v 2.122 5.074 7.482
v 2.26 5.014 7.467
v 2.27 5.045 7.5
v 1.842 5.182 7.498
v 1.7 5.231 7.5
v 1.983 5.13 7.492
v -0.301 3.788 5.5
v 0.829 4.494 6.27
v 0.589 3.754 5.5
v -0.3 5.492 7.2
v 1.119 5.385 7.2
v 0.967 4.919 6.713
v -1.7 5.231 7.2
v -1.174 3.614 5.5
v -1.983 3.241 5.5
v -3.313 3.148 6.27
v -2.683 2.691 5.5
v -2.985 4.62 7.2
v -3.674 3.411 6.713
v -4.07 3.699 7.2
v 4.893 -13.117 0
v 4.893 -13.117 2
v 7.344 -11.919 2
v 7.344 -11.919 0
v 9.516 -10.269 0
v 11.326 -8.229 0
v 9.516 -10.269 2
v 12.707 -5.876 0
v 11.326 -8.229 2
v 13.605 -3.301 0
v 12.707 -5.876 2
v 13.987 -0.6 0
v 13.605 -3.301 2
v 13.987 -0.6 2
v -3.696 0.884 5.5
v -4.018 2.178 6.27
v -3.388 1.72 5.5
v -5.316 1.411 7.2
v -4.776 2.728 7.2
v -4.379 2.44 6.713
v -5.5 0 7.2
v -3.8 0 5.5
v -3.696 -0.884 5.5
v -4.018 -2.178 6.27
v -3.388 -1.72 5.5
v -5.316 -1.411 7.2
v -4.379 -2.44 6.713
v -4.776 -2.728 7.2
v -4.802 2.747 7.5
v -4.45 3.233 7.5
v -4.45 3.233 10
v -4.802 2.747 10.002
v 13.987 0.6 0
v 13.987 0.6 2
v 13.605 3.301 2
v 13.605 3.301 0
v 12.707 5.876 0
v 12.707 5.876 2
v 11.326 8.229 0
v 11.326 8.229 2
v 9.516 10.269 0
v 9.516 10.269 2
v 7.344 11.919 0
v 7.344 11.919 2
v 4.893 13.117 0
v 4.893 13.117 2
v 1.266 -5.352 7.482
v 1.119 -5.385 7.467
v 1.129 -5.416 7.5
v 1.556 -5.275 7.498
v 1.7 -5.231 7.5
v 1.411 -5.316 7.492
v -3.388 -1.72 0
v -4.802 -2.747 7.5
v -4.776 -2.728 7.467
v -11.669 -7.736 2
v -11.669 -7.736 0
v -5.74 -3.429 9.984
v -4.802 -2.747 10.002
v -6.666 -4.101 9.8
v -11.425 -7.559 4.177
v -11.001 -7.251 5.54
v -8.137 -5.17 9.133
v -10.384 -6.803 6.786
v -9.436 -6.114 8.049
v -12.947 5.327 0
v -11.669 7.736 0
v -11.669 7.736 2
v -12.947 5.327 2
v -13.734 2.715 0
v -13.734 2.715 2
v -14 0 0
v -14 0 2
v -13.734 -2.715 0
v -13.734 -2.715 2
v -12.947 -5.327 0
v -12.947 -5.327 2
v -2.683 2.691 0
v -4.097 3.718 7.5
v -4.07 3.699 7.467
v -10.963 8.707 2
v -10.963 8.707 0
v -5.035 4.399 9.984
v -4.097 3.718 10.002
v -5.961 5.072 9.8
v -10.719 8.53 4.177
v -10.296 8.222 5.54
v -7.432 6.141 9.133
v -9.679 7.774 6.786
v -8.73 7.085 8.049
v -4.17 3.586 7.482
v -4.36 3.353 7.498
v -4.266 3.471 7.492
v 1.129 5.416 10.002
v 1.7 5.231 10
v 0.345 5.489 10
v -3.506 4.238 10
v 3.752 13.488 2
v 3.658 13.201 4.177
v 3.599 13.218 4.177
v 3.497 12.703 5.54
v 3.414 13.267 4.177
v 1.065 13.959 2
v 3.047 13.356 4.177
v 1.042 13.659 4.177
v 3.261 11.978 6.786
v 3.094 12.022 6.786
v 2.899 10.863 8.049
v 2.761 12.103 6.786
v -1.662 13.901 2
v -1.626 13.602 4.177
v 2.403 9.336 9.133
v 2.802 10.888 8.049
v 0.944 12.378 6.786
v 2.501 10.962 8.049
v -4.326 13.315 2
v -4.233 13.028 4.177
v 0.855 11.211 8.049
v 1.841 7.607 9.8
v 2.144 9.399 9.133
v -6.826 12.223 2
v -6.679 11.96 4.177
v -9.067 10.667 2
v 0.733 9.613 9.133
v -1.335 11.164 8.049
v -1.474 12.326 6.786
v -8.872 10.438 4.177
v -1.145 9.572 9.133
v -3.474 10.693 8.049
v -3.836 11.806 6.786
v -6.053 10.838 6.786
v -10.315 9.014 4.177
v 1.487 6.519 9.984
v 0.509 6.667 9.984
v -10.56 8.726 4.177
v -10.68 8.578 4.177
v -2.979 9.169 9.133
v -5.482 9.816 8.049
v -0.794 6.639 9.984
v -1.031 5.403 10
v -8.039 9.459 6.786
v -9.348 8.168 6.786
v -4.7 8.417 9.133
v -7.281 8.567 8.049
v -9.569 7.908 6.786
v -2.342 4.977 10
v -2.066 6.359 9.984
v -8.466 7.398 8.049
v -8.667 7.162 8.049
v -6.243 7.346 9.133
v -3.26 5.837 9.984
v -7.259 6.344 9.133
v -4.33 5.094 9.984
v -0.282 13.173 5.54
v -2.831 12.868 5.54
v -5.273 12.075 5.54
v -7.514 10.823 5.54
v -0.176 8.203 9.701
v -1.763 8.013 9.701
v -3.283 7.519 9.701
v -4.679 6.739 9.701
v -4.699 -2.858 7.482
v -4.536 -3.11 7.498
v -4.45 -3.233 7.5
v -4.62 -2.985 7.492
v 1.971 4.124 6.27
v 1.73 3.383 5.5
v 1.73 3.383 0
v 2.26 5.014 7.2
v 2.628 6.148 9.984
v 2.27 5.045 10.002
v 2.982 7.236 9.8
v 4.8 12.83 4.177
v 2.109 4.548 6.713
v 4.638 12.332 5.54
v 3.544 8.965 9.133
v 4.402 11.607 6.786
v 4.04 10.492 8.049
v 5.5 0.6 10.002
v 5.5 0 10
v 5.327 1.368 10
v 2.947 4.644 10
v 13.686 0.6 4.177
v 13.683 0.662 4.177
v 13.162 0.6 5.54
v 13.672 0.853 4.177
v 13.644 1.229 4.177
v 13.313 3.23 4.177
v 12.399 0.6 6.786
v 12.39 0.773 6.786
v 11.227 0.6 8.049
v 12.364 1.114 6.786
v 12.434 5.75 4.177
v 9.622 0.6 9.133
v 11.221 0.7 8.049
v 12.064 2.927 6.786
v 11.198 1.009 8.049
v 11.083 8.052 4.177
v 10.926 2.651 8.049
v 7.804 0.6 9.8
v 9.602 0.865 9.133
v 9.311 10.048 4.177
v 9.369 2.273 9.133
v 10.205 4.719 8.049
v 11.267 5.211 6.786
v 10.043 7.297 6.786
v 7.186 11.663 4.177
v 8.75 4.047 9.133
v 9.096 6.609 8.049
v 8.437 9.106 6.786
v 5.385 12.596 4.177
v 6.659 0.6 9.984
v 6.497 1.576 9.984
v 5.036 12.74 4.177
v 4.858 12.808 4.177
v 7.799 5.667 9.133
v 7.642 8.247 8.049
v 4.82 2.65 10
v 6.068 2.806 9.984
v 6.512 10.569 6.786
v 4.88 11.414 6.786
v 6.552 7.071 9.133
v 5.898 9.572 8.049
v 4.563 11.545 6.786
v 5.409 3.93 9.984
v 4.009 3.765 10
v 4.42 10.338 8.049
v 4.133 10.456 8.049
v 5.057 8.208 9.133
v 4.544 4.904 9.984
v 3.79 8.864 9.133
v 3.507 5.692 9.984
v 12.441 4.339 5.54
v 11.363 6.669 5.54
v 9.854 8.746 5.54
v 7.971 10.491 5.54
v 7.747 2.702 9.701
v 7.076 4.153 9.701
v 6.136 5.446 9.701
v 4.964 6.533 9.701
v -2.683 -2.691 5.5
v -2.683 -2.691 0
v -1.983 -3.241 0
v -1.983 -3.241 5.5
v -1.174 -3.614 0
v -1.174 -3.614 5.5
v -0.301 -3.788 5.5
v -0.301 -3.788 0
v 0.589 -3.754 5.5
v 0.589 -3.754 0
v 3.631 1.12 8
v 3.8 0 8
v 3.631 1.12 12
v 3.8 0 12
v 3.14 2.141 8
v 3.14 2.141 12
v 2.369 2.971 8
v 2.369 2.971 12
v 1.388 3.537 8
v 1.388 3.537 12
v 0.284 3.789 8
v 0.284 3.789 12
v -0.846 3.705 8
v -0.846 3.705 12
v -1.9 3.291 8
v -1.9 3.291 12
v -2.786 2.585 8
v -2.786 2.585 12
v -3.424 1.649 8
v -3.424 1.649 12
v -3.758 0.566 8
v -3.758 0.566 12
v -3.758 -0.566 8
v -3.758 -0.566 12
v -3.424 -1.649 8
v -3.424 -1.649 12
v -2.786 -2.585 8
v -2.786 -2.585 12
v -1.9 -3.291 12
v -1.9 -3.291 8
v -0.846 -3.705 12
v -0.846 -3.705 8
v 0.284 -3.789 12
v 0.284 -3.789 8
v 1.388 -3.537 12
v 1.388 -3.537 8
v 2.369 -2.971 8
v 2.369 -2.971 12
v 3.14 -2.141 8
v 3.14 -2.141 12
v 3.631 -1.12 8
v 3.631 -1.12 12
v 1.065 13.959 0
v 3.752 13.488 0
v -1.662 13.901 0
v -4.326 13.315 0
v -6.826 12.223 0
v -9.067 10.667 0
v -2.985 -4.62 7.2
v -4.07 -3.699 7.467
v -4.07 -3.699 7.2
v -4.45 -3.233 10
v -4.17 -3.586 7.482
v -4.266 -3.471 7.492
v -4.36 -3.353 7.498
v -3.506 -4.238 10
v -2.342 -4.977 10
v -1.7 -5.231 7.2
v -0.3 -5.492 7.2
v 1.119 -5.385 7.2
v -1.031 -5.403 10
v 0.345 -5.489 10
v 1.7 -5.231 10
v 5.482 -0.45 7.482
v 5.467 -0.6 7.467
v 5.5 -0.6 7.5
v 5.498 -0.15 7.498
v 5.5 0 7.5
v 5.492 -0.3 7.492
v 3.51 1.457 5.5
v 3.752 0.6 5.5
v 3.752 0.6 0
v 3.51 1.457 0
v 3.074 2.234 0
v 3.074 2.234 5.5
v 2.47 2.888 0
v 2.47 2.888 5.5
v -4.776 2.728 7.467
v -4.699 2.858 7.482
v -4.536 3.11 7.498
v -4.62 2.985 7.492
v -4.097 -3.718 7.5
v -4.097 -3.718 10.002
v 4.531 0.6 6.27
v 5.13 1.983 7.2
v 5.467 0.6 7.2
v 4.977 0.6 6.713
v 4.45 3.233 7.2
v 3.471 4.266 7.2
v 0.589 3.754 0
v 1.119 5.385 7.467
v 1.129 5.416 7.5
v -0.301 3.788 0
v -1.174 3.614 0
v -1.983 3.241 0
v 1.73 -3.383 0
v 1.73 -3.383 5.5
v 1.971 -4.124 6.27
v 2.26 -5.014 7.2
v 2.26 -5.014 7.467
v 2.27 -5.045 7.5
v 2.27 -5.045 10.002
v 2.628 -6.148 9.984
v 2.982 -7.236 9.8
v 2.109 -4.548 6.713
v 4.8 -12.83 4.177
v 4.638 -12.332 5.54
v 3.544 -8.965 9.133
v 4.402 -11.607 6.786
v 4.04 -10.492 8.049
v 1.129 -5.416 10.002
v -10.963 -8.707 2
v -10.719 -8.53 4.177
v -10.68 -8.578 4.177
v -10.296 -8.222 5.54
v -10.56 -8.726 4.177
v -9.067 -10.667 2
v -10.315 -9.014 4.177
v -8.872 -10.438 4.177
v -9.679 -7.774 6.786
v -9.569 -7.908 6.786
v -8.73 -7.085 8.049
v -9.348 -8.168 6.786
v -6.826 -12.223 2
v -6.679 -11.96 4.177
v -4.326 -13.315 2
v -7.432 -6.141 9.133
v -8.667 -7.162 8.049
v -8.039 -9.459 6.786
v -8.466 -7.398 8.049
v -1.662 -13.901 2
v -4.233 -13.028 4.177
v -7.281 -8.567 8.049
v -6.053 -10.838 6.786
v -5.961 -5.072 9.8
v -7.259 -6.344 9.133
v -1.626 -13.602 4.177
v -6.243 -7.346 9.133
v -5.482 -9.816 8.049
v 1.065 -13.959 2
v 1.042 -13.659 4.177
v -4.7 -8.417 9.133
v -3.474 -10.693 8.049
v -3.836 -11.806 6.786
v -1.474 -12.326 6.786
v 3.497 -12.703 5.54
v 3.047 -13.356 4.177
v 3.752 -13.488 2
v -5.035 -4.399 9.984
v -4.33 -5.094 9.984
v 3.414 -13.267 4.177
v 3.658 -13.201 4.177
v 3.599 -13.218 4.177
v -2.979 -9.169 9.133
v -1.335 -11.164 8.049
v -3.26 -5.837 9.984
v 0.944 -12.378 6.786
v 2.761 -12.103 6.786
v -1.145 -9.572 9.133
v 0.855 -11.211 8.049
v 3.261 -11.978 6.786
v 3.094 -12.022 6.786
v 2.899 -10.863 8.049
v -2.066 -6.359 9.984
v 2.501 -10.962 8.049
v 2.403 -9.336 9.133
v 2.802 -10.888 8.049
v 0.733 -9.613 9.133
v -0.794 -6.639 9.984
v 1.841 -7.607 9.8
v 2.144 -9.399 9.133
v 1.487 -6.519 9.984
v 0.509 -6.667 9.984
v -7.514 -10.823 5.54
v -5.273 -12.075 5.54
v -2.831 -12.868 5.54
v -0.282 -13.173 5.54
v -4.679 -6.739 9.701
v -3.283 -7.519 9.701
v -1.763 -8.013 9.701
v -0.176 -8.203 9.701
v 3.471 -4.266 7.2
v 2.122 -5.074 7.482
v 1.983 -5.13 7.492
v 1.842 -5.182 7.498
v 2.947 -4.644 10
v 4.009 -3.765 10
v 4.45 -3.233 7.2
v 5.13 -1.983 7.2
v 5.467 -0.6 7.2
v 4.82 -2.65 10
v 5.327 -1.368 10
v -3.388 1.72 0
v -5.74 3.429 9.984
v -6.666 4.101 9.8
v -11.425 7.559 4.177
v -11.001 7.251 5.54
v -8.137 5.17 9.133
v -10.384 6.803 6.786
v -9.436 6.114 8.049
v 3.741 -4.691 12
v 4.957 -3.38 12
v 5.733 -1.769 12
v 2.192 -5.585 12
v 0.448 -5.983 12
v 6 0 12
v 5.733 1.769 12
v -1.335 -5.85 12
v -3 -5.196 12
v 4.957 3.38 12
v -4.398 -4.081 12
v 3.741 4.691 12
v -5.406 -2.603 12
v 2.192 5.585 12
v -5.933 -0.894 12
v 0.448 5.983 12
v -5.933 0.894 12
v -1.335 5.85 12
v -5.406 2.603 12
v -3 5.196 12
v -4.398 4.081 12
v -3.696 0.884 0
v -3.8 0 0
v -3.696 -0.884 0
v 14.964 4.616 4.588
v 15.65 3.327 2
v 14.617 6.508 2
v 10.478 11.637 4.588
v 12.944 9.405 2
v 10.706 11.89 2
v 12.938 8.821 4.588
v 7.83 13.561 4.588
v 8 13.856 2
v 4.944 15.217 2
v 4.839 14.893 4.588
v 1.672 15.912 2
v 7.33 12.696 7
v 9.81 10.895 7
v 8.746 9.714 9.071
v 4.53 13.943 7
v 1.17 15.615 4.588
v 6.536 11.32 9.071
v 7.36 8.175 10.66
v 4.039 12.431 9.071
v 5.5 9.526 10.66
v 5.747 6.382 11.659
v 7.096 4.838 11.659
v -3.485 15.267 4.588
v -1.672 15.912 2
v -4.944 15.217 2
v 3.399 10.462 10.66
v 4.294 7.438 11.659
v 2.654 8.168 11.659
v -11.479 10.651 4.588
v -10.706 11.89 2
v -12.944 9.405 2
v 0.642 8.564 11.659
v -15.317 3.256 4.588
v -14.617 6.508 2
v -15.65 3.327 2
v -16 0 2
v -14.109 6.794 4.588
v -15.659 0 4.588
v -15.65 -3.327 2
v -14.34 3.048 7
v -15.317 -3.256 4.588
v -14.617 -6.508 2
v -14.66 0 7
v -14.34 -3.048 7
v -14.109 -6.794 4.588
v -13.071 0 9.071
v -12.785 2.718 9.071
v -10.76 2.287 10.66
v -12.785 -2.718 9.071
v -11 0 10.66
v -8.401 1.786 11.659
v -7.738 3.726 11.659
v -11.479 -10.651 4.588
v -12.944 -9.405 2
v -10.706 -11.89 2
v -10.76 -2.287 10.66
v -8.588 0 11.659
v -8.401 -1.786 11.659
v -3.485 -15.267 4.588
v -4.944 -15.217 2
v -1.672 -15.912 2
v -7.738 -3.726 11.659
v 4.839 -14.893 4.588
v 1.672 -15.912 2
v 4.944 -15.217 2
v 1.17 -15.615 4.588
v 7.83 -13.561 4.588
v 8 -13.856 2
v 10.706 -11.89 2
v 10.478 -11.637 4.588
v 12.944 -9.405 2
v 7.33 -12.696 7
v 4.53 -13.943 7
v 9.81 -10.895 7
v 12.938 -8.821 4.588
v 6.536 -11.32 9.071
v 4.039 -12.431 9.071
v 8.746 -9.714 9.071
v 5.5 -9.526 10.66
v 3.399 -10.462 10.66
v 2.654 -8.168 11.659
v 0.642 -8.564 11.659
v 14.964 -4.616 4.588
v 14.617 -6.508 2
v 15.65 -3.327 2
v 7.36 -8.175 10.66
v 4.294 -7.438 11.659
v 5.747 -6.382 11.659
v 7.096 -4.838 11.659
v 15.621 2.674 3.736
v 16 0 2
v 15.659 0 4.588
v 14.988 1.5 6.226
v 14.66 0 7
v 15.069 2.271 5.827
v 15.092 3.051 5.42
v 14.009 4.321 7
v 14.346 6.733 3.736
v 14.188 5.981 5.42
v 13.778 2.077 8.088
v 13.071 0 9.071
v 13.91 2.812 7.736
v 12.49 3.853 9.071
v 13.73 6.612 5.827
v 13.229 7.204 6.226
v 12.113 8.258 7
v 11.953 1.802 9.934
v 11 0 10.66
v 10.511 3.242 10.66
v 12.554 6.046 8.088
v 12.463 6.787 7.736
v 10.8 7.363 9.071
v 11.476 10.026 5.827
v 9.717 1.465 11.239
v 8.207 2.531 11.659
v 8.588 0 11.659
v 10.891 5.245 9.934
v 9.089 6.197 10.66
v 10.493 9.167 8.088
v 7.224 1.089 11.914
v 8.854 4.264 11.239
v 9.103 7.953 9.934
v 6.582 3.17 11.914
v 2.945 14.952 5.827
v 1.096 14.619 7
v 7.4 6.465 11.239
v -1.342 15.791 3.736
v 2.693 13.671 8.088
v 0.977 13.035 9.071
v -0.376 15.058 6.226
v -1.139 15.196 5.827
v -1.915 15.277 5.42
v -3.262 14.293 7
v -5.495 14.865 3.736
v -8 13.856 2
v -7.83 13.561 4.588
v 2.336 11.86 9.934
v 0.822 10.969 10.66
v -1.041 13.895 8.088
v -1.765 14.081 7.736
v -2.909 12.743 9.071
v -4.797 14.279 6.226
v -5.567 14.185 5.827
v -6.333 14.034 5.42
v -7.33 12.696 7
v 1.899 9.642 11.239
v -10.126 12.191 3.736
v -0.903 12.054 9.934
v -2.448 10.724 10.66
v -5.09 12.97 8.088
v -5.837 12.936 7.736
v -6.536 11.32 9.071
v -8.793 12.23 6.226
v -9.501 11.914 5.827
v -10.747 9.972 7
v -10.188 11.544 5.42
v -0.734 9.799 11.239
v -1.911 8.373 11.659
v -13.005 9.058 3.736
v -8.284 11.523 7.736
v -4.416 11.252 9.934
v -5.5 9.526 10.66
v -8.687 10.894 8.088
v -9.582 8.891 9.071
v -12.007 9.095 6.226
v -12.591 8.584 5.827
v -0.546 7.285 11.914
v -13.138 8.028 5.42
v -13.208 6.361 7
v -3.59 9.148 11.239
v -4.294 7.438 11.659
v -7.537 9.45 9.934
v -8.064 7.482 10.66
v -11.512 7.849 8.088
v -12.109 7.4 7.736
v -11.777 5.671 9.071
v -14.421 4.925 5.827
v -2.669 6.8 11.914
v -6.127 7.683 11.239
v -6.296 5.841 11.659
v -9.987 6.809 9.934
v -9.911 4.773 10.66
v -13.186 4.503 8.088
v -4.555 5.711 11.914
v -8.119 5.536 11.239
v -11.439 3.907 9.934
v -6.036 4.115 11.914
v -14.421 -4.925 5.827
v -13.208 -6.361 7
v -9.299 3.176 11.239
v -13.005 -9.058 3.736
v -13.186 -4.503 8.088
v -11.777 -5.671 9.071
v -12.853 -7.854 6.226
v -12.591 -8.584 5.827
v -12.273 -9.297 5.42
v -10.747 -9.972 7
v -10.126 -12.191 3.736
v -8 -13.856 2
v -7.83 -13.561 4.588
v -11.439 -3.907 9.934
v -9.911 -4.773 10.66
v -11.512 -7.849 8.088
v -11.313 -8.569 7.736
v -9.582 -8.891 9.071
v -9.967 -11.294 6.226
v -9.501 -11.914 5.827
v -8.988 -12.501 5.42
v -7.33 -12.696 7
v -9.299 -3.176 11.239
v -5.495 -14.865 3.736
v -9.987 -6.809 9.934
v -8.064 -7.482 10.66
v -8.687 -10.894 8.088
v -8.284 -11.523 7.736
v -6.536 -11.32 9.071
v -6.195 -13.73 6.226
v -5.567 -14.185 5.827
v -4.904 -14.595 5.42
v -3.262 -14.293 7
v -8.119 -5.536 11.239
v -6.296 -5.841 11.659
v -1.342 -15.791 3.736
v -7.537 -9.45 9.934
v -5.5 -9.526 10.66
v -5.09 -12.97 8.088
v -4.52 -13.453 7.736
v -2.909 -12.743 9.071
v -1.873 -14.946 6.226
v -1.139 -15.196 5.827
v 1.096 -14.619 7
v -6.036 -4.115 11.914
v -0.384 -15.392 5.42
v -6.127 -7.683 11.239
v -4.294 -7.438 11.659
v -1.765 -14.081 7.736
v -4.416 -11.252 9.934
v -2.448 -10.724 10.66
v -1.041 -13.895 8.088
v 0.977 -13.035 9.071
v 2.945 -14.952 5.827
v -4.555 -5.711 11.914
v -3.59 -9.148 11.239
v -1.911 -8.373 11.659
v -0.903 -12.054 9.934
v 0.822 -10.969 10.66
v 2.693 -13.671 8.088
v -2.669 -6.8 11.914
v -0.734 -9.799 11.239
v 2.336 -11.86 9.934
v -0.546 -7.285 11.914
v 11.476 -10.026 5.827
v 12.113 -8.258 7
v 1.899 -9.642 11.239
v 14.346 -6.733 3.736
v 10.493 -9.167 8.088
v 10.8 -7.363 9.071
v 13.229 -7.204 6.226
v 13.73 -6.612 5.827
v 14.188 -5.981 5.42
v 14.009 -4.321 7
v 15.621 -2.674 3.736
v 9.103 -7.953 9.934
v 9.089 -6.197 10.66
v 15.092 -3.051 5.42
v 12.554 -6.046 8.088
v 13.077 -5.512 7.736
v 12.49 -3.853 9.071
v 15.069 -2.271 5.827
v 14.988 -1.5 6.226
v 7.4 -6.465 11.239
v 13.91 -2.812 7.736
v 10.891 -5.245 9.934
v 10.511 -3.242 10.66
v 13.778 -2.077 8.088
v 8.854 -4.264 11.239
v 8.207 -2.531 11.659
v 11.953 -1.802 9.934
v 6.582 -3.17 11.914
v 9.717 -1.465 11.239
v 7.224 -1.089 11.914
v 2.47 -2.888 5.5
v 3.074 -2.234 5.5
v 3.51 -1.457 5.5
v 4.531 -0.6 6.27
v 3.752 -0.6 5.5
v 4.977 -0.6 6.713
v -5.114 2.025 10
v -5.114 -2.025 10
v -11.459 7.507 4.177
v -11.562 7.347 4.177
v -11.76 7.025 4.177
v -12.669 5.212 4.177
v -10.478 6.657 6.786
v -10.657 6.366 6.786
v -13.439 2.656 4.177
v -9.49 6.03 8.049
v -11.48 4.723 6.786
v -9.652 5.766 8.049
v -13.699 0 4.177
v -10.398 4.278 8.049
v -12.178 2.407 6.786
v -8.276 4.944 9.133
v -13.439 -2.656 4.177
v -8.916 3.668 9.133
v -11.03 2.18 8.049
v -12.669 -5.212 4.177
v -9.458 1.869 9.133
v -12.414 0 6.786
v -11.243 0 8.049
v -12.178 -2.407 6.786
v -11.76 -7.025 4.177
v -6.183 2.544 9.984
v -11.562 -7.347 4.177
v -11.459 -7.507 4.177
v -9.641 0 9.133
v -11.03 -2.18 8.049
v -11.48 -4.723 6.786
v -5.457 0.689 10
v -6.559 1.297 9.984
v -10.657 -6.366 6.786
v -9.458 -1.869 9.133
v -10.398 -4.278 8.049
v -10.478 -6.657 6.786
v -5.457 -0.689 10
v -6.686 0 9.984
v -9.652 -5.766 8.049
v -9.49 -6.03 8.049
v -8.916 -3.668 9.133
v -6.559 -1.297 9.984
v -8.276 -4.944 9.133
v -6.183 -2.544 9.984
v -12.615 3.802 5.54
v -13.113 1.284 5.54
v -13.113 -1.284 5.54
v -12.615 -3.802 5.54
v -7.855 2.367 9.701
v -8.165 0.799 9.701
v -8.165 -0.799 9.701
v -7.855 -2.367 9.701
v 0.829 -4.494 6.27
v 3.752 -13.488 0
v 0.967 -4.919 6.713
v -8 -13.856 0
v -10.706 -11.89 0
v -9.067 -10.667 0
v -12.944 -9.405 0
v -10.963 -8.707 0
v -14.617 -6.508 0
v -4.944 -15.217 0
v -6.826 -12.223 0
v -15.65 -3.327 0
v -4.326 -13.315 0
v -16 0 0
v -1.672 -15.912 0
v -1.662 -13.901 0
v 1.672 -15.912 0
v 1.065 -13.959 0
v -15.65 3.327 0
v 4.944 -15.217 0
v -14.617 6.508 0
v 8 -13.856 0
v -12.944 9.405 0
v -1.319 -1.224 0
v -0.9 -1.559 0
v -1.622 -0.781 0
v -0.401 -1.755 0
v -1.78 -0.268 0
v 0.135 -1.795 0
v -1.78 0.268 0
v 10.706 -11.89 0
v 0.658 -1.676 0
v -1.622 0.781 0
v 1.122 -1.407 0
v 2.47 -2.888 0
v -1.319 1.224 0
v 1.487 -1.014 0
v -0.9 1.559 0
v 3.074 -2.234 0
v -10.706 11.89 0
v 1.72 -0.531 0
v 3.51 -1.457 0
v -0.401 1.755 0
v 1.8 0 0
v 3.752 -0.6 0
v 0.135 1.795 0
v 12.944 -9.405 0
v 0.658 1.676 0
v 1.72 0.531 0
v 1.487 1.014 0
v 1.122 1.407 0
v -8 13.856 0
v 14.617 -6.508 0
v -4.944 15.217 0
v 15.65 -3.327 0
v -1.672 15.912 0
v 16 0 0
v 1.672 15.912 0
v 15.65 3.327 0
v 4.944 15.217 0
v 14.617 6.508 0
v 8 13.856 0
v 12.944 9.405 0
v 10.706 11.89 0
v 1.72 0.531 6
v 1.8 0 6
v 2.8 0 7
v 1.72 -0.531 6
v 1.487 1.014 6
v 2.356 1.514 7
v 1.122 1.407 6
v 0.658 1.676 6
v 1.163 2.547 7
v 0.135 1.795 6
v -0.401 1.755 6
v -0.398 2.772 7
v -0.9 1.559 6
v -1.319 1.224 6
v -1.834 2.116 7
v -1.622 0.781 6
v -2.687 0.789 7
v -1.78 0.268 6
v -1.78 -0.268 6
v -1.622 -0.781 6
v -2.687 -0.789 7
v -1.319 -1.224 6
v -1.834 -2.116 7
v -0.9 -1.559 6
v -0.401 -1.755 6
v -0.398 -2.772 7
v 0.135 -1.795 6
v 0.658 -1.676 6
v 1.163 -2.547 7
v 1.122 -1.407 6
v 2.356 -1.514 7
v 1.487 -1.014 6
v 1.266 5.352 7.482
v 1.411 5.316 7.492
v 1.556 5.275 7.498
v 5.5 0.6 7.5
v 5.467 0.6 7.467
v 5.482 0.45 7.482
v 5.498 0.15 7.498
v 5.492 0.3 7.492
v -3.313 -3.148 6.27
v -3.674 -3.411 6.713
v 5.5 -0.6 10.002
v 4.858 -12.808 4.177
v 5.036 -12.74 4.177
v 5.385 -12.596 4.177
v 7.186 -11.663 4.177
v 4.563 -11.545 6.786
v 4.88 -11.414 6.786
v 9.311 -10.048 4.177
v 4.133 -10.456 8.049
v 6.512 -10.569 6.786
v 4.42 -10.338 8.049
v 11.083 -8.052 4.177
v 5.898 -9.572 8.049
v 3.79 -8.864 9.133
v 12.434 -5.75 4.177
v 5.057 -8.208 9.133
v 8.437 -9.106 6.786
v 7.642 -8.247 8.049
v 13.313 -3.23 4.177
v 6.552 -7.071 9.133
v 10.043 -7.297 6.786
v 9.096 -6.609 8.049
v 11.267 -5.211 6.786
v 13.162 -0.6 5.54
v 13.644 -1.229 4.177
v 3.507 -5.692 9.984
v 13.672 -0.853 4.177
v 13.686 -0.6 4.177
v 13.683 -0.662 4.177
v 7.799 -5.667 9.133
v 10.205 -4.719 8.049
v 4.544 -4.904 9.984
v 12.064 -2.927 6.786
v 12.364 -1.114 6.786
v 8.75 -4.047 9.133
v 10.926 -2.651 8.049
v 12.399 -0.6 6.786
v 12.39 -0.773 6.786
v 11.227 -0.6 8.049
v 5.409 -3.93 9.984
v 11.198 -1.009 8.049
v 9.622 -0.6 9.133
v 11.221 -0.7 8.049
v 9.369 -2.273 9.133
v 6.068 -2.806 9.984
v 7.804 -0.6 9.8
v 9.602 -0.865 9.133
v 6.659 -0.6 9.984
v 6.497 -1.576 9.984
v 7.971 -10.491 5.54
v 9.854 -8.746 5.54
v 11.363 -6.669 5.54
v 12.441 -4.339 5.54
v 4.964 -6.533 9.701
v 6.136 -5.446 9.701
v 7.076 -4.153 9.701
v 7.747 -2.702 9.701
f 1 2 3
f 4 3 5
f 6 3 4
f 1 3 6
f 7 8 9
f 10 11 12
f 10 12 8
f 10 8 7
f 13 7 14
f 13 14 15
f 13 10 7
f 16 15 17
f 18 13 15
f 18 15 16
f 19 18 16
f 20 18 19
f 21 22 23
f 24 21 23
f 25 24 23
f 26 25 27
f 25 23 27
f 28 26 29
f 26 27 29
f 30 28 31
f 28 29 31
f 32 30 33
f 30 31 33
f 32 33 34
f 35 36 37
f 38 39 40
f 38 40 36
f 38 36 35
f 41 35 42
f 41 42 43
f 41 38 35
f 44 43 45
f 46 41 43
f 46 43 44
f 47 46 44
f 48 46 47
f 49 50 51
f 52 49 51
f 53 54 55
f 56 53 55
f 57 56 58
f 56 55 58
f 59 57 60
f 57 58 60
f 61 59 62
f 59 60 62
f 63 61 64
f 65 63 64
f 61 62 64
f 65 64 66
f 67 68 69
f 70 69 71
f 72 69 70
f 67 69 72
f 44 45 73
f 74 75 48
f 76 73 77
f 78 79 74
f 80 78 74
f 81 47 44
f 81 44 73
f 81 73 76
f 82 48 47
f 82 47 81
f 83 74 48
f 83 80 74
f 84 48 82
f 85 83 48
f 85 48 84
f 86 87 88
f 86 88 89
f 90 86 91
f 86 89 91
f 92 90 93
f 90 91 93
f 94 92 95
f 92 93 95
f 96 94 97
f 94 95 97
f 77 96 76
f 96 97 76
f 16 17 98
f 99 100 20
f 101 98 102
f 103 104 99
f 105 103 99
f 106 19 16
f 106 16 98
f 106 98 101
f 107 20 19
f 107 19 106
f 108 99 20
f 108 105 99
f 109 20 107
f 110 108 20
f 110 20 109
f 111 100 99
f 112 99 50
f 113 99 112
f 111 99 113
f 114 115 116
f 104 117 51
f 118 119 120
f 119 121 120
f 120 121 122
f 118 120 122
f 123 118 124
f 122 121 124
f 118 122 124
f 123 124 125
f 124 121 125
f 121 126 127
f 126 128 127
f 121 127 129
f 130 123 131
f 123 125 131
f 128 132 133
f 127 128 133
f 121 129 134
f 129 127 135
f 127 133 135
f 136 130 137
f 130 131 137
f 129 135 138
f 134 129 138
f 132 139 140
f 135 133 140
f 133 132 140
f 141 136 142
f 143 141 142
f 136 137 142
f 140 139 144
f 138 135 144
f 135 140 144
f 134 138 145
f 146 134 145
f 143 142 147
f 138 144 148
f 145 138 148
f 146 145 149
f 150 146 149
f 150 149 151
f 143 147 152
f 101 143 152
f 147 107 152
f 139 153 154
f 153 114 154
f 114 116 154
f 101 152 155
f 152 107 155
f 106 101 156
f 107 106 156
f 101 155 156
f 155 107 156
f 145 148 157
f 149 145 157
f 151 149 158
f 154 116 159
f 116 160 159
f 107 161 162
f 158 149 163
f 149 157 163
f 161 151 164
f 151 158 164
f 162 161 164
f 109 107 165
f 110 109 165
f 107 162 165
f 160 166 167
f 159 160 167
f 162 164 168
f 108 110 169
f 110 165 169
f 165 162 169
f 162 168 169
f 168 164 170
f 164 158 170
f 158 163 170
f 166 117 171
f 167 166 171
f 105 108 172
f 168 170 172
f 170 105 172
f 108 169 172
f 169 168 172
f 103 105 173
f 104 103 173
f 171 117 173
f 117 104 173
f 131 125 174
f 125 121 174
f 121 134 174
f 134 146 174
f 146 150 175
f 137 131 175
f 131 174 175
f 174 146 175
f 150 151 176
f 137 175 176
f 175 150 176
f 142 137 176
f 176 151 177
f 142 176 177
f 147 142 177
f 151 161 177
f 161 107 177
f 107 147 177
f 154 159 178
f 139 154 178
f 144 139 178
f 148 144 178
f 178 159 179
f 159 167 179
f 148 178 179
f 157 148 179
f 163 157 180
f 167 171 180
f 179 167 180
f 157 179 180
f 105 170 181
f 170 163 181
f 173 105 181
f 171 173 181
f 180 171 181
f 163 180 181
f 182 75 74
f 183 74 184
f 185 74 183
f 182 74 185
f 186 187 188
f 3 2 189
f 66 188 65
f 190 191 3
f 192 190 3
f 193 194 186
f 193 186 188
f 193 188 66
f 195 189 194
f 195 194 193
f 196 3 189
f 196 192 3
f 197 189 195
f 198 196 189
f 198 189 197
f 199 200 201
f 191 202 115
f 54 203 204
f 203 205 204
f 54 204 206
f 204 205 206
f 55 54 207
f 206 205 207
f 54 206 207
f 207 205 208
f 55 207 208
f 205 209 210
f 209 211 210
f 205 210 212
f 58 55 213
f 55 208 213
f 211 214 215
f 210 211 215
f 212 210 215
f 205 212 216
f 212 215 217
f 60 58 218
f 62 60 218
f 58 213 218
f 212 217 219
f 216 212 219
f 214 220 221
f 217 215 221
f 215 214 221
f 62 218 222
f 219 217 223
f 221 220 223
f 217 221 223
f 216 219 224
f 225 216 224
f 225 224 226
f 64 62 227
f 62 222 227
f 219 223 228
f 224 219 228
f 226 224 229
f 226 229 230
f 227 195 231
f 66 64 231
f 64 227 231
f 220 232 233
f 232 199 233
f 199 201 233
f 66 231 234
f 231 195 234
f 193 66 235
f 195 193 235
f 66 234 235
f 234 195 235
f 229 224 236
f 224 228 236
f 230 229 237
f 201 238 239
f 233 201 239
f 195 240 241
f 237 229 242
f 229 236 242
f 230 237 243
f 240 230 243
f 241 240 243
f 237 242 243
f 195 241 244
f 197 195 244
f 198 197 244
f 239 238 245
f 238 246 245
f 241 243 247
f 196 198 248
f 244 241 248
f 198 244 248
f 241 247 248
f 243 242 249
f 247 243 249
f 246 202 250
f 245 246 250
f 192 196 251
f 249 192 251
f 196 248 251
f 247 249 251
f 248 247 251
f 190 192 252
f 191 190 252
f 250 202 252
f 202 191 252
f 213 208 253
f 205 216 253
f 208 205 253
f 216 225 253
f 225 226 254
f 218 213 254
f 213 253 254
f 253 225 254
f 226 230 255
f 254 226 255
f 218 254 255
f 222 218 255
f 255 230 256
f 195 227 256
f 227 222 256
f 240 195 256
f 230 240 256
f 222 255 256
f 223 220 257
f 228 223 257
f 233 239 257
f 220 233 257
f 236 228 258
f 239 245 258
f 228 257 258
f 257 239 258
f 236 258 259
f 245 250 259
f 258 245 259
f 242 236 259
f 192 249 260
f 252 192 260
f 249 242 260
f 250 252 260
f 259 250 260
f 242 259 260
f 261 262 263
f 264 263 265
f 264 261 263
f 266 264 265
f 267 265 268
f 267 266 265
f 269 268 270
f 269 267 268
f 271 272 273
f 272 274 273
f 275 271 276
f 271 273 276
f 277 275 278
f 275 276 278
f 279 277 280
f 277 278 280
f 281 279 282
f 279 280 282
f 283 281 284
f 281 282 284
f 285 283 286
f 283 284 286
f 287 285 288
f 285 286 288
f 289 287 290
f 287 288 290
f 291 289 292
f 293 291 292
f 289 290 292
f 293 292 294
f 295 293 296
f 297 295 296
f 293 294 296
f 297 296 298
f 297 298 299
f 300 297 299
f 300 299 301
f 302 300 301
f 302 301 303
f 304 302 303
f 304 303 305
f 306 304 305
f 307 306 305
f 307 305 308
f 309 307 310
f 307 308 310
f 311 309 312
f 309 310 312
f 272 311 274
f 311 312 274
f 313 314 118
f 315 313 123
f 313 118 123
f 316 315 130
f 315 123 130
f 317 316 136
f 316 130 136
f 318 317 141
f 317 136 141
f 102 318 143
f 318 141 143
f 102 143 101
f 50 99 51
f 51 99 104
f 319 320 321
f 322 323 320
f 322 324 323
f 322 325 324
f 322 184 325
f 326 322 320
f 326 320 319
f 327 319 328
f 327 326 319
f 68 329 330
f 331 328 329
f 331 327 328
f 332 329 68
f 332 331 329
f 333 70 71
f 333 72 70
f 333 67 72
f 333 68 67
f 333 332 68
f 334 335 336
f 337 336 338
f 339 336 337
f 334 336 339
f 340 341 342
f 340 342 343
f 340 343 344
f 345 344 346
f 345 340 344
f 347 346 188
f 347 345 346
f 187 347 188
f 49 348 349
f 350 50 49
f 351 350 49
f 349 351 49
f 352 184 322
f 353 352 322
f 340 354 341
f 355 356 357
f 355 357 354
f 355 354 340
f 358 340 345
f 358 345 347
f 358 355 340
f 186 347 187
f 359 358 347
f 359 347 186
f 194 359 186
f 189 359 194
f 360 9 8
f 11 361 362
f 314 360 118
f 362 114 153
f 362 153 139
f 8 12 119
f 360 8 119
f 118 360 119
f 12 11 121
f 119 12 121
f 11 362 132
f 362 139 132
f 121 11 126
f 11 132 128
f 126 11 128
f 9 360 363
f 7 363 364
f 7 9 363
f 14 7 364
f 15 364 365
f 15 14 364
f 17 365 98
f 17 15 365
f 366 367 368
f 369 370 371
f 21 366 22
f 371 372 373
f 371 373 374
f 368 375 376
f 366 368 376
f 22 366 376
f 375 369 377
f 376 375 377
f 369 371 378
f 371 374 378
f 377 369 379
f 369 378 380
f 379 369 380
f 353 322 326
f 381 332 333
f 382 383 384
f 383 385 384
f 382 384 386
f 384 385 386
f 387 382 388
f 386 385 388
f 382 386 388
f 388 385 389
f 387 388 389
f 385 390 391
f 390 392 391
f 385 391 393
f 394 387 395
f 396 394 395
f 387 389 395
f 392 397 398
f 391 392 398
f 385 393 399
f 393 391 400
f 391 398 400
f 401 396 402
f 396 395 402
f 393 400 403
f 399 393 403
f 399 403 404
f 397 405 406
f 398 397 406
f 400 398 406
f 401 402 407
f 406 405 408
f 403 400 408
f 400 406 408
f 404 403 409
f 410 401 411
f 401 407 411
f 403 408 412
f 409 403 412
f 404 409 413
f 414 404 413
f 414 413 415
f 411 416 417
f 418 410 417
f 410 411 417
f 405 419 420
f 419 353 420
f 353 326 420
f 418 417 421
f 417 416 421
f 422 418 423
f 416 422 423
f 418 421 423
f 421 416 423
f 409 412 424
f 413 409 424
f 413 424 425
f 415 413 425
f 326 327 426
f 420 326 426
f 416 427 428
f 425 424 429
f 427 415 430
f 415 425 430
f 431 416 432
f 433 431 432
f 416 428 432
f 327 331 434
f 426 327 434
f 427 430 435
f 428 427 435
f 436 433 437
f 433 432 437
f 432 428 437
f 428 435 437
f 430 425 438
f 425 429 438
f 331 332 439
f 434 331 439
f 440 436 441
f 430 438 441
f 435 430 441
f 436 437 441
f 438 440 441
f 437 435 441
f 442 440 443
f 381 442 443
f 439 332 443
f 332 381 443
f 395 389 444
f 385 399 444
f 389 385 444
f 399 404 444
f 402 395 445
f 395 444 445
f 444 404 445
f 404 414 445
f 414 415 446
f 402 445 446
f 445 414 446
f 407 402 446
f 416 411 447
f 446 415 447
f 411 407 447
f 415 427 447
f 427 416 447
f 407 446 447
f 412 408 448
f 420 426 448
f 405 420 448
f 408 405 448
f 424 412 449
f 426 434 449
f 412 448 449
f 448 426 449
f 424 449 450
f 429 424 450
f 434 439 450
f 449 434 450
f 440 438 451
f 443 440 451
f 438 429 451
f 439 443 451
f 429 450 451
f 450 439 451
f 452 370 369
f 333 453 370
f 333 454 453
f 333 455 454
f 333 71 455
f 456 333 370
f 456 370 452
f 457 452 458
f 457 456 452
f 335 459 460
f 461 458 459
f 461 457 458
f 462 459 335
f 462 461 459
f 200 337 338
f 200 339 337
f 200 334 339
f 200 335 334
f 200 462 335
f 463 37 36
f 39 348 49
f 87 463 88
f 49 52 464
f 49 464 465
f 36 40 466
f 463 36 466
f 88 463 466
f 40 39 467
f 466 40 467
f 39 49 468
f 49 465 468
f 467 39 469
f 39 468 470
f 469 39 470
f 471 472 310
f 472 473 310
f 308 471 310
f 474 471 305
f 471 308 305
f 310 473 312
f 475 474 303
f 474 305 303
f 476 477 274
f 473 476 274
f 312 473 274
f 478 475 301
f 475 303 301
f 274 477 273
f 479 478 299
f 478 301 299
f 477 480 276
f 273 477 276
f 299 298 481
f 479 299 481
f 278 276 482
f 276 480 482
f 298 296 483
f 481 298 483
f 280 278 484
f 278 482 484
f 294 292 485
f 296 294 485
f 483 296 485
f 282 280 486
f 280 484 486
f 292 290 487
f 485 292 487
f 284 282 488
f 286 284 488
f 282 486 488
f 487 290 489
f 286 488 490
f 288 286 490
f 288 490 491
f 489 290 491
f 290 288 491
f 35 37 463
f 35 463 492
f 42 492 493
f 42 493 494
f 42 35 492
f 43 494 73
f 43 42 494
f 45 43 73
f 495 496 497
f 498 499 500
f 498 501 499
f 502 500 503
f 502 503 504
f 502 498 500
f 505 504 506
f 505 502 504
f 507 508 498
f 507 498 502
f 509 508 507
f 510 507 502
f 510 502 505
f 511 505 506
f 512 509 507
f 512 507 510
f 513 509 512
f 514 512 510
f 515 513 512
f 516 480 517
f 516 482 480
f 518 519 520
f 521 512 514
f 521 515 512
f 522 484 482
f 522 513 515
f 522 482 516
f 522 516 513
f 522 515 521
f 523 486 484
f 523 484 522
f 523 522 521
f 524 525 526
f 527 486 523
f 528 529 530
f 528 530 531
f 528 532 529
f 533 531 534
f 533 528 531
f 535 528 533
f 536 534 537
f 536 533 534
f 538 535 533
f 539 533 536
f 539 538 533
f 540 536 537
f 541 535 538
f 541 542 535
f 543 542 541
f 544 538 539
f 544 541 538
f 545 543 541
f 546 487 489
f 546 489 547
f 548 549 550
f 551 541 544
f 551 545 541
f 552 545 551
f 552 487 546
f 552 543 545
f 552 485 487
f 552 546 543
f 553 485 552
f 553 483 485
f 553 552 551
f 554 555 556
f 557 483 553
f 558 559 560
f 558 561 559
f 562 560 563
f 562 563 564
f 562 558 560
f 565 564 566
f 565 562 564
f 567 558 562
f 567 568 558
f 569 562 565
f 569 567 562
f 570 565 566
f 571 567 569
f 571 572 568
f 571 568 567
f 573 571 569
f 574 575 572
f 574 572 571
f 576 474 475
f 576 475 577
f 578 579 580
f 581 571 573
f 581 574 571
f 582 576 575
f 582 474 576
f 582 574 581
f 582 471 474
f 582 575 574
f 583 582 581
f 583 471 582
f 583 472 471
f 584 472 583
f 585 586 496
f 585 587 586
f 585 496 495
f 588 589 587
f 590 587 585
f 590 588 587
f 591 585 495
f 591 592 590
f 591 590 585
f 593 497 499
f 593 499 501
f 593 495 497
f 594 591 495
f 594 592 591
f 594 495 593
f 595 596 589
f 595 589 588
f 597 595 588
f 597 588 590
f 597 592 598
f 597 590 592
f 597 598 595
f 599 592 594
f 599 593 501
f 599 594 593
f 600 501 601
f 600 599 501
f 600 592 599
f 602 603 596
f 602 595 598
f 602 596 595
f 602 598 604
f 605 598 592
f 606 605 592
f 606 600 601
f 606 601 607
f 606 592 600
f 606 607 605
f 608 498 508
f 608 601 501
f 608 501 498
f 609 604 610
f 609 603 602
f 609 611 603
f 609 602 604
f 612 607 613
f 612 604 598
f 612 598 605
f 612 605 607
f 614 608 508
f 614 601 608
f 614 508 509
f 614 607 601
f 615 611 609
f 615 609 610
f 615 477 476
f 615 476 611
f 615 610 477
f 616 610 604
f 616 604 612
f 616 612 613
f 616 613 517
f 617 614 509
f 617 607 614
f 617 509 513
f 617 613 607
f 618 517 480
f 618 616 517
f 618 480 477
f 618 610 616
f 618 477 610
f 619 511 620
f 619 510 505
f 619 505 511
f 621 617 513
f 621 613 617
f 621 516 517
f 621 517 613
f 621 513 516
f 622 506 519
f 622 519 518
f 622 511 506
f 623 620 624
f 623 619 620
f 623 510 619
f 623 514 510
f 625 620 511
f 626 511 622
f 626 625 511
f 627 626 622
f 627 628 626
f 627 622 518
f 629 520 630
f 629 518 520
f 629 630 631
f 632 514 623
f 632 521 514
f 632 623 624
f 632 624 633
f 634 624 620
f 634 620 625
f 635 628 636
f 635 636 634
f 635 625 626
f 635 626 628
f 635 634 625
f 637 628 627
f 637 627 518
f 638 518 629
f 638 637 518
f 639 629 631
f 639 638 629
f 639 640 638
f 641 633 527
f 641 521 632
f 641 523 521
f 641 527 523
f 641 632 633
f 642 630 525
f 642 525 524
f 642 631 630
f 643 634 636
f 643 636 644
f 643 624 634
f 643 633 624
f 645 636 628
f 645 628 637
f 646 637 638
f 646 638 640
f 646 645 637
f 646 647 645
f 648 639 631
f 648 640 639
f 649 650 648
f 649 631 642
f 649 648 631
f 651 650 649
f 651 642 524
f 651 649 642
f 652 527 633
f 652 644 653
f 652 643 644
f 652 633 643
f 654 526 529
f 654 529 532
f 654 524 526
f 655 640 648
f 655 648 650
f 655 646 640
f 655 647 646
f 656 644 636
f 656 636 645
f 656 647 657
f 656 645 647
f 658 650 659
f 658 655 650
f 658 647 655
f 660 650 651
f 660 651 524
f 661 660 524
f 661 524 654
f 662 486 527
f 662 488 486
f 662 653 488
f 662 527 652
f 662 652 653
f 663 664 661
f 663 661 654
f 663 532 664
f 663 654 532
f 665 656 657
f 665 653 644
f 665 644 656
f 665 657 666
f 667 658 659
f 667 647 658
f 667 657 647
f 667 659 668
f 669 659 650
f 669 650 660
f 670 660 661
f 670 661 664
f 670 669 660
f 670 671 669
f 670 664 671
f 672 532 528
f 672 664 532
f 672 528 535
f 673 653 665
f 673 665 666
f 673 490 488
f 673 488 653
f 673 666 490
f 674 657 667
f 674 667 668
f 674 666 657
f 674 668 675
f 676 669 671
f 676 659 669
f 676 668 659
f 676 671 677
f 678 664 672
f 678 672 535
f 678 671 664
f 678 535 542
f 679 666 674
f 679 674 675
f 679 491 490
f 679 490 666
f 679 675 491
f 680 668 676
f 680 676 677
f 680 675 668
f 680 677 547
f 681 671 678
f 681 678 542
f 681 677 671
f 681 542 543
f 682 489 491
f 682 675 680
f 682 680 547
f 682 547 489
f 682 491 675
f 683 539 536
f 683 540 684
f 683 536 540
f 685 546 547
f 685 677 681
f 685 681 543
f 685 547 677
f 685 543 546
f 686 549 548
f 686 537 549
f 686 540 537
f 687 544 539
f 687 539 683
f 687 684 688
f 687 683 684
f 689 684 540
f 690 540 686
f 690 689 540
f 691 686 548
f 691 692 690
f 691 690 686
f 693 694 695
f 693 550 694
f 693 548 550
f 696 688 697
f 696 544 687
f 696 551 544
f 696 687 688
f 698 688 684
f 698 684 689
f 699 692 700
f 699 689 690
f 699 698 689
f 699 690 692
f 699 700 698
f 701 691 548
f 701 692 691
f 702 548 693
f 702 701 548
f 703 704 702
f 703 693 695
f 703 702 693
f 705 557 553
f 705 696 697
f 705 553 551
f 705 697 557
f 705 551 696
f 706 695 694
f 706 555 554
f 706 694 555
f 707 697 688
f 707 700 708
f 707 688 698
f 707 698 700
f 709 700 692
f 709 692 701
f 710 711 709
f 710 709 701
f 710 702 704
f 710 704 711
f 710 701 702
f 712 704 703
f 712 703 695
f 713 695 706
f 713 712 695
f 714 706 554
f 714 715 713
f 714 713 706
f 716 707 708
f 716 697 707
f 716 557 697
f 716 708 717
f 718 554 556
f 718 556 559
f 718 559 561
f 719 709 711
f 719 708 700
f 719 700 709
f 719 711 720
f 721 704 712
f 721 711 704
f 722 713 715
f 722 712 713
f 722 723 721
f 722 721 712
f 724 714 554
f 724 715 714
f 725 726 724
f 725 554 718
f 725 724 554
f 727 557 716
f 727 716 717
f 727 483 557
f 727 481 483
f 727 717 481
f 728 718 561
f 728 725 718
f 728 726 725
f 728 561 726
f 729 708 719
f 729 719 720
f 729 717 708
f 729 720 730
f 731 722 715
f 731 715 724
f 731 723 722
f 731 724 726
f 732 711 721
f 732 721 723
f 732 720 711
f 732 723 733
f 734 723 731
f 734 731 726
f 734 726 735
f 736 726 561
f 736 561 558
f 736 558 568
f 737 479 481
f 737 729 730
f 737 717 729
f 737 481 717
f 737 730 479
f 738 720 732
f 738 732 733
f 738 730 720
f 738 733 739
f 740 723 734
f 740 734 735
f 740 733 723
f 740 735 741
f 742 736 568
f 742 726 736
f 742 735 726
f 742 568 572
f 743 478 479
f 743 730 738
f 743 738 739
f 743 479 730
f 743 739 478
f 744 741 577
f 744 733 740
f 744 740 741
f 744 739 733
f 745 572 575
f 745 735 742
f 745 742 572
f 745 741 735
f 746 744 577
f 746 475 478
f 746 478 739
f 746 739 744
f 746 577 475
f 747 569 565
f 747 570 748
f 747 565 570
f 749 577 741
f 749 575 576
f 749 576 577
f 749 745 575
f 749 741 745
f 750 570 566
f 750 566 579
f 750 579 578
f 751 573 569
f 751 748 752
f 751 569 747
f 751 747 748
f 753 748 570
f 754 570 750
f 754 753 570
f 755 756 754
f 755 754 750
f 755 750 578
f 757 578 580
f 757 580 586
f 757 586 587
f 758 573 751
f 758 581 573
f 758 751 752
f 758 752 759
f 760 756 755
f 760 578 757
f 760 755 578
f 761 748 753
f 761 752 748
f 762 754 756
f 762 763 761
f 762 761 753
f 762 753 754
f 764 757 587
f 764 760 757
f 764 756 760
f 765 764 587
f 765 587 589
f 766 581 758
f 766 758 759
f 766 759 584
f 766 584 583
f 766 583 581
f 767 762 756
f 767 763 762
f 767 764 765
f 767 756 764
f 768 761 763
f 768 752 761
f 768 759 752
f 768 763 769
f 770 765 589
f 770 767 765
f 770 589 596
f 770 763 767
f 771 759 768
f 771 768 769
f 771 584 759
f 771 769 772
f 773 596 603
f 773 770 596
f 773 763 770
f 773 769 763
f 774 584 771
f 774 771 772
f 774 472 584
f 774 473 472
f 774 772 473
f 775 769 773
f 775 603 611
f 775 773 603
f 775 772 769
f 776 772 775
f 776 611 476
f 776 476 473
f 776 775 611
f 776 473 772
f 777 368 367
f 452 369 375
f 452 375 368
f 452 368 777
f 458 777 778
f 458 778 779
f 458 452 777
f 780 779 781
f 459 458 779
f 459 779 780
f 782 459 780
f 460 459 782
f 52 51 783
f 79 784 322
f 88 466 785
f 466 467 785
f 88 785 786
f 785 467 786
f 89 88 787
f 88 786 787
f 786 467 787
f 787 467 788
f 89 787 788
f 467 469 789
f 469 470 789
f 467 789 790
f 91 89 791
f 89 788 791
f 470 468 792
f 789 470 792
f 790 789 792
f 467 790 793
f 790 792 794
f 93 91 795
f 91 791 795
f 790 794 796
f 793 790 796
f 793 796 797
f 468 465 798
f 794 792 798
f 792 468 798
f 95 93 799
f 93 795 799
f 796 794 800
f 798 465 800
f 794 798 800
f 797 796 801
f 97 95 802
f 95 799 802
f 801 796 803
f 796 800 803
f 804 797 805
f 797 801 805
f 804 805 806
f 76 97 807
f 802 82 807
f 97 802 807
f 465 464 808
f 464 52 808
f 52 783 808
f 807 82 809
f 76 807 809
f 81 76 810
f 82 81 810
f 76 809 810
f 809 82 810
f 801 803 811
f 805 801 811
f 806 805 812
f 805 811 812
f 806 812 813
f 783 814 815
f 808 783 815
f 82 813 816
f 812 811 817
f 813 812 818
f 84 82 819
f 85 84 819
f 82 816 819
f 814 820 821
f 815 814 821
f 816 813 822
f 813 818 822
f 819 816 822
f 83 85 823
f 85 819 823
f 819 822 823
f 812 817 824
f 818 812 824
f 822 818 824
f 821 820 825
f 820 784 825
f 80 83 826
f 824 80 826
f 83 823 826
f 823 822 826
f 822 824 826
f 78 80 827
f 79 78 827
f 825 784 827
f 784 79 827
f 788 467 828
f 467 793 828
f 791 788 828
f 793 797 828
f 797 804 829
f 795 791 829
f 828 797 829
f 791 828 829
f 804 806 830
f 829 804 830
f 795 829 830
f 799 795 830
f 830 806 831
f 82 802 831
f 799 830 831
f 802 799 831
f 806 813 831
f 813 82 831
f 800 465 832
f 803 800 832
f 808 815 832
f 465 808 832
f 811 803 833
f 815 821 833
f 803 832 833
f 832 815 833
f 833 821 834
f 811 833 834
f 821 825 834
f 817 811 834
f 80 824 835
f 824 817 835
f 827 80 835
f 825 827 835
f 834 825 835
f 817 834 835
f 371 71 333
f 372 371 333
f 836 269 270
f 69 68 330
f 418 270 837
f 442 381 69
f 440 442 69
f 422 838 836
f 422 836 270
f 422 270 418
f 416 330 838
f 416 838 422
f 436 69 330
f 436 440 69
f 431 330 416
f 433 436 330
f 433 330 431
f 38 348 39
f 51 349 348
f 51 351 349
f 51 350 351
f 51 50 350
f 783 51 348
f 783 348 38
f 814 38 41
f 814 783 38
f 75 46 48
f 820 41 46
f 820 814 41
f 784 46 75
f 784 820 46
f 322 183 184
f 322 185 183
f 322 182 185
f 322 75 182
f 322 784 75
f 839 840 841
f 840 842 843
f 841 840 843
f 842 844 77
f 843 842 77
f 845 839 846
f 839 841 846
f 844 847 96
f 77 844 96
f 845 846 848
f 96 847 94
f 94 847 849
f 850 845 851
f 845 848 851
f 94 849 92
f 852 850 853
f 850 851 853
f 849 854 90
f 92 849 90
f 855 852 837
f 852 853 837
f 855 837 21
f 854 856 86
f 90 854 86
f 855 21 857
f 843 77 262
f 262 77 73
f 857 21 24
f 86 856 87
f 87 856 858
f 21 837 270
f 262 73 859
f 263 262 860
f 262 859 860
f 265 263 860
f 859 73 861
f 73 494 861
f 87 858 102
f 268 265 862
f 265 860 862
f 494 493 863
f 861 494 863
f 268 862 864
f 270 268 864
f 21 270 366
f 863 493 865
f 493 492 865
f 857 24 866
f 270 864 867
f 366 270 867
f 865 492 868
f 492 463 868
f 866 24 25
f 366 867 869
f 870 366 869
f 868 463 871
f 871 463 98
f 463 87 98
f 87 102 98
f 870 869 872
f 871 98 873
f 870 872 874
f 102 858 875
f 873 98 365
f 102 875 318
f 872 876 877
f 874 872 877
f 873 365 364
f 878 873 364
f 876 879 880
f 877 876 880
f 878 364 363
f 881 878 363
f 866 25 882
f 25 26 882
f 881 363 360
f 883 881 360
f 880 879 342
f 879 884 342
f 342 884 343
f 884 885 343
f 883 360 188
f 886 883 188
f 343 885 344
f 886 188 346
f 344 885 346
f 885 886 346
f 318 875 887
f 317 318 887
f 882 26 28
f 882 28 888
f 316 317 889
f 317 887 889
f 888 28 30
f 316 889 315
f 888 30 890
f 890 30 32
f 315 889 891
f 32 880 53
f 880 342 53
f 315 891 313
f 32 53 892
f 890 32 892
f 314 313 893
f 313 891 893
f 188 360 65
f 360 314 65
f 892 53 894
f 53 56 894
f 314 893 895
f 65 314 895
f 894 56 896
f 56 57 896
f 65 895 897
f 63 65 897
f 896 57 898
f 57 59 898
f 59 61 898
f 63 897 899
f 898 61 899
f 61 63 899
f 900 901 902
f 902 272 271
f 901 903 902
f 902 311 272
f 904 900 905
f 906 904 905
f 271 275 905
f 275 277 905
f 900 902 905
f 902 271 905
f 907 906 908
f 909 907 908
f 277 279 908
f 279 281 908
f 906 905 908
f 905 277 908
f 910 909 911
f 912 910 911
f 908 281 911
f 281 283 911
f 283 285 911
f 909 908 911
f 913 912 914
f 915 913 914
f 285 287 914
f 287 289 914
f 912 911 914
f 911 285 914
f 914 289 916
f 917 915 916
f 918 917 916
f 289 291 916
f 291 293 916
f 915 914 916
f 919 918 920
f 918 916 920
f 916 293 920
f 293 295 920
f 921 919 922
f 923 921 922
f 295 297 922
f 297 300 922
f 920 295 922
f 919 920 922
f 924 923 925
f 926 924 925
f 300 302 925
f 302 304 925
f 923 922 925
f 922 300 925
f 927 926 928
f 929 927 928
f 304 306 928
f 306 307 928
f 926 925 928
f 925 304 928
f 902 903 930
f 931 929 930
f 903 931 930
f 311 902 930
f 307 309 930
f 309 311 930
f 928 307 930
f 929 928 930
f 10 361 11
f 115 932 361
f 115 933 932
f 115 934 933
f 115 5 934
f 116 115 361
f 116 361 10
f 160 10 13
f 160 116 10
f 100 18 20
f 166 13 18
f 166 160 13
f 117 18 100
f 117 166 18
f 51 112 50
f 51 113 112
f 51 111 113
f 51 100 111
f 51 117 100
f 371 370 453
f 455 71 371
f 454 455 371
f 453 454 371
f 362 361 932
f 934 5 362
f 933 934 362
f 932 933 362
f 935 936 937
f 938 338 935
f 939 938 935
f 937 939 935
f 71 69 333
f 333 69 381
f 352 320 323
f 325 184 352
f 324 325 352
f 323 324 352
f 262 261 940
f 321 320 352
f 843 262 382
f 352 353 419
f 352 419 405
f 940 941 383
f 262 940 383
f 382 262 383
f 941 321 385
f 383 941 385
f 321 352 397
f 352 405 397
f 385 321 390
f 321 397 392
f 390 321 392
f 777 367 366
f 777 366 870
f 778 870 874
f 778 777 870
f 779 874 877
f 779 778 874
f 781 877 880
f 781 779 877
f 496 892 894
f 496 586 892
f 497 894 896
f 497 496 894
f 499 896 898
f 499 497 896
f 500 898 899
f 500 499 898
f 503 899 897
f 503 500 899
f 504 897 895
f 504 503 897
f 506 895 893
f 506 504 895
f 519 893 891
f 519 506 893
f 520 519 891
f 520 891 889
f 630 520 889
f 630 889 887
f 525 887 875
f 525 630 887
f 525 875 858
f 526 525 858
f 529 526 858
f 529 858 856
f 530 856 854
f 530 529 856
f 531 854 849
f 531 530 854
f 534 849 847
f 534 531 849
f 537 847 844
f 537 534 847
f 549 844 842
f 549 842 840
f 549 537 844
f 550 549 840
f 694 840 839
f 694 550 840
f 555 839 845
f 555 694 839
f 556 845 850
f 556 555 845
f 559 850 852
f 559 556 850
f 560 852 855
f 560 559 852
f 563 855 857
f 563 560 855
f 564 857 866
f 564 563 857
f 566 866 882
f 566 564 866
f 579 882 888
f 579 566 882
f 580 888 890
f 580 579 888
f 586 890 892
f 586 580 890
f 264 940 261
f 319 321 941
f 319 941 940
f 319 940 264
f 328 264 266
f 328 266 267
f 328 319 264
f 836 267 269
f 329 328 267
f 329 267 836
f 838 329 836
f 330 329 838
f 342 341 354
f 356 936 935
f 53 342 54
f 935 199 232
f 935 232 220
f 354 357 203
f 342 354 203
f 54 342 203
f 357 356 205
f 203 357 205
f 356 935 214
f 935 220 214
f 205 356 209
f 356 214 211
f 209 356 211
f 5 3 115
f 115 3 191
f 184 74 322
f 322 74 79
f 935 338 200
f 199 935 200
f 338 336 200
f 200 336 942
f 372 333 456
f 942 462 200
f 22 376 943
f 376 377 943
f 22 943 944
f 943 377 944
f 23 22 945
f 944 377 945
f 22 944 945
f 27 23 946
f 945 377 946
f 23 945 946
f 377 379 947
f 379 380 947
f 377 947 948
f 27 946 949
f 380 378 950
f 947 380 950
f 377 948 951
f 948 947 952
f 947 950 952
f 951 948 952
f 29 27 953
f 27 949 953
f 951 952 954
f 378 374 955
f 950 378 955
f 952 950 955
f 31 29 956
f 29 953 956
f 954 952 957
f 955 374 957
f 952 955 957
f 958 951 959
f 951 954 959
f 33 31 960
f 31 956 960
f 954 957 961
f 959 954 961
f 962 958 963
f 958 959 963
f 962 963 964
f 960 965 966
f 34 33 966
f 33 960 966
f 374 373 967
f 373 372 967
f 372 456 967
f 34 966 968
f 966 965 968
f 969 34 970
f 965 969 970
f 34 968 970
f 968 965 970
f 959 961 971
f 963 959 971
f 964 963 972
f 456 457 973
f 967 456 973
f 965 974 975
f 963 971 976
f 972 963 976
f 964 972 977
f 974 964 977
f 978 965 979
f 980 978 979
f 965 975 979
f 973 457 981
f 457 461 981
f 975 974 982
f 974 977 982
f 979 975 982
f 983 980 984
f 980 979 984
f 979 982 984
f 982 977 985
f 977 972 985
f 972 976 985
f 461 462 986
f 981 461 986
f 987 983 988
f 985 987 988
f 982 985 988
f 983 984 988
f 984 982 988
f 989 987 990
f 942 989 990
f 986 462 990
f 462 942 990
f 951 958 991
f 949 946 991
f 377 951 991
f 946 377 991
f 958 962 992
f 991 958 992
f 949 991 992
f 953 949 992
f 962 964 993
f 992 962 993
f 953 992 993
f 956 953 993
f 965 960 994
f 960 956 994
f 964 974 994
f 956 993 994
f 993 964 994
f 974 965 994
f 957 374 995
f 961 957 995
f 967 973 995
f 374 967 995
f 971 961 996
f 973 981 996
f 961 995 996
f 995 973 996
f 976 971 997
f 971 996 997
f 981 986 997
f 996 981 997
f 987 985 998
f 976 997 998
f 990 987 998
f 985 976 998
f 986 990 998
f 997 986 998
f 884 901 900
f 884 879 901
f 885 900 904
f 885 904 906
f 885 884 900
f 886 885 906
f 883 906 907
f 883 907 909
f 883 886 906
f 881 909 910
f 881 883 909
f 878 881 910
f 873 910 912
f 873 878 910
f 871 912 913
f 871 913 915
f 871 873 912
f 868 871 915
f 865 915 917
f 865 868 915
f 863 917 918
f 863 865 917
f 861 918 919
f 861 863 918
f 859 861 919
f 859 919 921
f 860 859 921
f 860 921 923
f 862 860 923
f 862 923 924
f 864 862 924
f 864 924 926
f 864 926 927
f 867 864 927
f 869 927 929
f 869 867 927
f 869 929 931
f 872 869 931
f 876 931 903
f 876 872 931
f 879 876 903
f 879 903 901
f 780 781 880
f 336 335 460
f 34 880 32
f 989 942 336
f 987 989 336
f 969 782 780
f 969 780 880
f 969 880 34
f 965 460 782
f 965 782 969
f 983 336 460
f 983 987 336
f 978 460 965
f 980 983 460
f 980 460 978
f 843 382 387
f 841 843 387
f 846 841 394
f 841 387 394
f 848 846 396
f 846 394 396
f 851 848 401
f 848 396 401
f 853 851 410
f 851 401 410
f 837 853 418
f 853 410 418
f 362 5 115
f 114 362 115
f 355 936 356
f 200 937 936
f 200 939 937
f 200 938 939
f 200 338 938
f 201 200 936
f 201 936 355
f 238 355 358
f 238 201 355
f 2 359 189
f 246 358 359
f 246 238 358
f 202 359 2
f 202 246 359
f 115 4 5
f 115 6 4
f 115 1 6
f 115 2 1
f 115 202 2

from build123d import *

# Parameters (mm, degrees)
PAD_DEPTH          = 0.6
POLARPATTERN_COUNT = 5


with BuildPart() as part:
    # Sketch → Revolution (revolve)
    with BuildSketch(Plane.XZ):
        with BuildLine():
            Line((16, 0), (16, 2))
            ThreePointArc((16, 2), (13.071068, 9.071068), (6, 12))
            Line((3.8, 12), (6, 12))
            Line((3.8, 8), (3.8, 12))
            Line((1.8, 6), (3.8, 8))
            Line((1.8, 6), (1.8, 0))
            Line((1.8, 0), (3.8, 0))
            Line((3.8, 0), (3.8, 5.5))
            Line((3.8, 5.5), (5.5, 7.2))
            Line((5.5, 7.2), (5.5, 10))
            ThreePointArc((14, 2), (11.478291, 7.836309), (5.5, 10))
            Line((14, 0), (14, 2))
            Line((16, 0), (14, 0))
        make_face()
    revolve(axis=Axis((0, 0, 0), (0, 0, 1)))

    # Sketch001 → Pad (new body, symmetric)
    with BuildSketch(Plane.XZ):
        with BuildLine():
            Line((14.5, 0), (14.5, 2))
            ThreePointArc((14.5, 2), (11.892744, 8.543126), (5.5, 11.5))
            Line((5.5, 7.5), (5.5, 11.5))
            Line((3.5, 5.5), (5.5, 7.5))
            Line((3.5, 0), (3.5, 5.5))
            Line((3.5, 0), (14.5, 0))
        make_face()
    pad = extrude(amount=PAD_DEPTH, both=True)

    # PolarPattern: Pad ×5 about axis
    polarpattern_axis = Axis((0, 0, 0), (0, 0, 1))
    for i in range(1, POLARPATTERN_COUNT):
        add(pad.rotate(polarpattern_axis, i * 360 / POLARPATTERN_COUNT))


solid = part.part
